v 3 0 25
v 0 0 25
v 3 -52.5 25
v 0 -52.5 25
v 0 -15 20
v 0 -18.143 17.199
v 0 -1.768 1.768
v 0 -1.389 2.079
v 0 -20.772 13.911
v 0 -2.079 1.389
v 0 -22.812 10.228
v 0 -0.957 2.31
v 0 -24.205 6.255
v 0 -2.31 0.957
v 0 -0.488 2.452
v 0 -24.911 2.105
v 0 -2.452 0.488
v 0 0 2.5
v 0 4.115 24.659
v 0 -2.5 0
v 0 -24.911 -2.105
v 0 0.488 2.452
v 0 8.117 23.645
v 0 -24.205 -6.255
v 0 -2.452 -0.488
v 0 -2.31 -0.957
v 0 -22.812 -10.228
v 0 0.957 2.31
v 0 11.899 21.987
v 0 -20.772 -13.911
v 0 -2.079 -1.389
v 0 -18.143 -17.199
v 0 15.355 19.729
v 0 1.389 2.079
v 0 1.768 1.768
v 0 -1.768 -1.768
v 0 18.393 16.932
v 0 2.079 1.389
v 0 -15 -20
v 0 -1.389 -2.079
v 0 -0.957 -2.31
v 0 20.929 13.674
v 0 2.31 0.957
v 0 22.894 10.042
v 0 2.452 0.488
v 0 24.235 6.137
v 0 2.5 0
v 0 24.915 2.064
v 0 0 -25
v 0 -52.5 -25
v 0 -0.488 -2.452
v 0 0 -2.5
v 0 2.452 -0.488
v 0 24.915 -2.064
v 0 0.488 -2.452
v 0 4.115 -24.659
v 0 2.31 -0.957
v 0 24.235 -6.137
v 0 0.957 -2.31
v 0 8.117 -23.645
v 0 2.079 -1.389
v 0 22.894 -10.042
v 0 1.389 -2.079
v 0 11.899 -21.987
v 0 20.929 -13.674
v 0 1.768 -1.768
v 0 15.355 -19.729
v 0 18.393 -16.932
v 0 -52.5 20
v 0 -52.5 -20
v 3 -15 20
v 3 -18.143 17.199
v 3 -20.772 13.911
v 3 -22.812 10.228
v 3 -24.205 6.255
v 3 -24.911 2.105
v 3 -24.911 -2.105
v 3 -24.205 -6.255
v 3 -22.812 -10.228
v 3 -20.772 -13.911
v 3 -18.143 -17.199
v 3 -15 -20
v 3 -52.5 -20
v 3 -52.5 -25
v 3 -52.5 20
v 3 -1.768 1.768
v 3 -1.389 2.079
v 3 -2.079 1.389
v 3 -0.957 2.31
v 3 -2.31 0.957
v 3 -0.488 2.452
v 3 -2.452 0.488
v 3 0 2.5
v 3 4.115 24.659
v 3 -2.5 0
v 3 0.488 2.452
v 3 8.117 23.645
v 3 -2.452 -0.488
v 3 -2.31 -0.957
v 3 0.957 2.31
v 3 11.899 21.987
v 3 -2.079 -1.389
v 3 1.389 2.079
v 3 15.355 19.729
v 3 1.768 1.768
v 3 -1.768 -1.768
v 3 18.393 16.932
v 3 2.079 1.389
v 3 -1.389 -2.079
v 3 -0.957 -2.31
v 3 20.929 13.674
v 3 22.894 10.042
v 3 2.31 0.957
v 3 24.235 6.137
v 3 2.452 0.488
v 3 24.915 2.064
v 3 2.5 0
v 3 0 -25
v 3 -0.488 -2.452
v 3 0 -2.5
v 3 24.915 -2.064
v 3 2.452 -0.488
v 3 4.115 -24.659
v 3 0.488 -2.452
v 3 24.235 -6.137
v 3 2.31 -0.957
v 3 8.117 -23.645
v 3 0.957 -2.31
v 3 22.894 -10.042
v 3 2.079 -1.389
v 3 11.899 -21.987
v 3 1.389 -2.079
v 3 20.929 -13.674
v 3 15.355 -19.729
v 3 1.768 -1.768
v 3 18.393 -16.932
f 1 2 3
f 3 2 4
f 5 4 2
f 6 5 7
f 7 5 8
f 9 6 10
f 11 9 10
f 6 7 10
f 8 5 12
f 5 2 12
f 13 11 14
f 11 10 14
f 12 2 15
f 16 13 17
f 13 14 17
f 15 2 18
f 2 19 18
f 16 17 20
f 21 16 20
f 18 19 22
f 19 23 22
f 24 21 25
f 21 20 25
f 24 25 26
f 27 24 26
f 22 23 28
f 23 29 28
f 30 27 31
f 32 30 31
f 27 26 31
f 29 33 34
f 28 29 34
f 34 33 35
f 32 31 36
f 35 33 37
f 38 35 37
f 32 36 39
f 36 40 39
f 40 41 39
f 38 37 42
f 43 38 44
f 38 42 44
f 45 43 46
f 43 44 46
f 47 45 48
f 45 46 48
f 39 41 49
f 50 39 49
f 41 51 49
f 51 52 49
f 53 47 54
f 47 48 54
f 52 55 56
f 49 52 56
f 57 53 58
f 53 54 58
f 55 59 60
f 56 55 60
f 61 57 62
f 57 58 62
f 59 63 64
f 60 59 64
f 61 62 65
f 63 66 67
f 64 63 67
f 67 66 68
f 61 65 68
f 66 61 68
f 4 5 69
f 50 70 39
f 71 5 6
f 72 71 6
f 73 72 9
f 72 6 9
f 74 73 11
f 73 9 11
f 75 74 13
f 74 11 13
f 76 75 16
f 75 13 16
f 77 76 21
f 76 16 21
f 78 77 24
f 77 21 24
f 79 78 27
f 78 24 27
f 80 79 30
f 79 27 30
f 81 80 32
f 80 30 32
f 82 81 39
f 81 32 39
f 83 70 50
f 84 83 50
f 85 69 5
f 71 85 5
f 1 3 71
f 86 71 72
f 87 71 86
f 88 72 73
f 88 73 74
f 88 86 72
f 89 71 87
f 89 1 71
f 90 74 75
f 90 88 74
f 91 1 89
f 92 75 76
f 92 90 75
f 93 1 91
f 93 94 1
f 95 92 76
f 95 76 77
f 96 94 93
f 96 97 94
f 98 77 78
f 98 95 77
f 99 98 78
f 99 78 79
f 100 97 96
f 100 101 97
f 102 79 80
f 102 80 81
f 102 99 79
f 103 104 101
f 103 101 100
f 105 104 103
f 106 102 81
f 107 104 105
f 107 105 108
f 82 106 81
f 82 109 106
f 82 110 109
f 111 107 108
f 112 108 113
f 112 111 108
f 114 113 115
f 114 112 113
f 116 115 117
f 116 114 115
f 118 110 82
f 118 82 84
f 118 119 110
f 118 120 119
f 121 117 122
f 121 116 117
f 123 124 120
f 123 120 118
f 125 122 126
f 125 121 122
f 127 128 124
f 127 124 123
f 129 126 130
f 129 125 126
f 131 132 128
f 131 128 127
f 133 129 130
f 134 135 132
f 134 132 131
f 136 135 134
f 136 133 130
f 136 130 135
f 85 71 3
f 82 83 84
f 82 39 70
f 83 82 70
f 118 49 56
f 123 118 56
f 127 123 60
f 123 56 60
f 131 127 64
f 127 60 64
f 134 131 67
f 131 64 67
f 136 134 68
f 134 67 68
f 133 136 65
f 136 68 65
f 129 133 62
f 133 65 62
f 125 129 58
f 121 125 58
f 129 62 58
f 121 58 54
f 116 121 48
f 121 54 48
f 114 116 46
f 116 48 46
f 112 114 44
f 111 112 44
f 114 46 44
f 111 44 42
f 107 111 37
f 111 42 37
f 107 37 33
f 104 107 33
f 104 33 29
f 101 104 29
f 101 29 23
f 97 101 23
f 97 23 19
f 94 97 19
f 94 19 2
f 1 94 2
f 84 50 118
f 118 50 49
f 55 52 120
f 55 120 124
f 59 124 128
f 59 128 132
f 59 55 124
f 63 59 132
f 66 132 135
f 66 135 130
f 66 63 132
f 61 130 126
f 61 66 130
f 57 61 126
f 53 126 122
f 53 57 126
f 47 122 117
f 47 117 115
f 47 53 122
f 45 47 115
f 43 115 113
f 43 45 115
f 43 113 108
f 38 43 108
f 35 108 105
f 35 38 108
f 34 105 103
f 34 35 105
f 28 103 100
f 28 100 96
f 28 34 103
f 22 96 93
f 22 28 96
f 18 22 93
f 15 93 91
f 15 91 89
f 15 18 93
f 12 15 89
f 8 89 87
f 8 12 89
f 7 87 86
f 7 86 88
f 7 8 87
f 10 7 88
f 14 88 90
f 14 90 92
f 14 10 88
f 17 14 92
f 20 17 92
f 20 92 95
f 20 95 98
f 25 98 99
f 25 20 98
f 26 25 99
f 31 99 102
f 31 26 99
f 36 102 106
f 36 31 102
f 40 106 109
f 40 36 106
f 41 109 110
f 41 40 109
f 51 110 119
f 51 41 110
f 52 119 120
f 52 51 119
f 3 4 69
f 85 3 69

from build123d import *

# Parameters (mm, degrees)
SKETCH1_R           = 2.5
BOSS_EXTRUDE1_DEPTH = 3


with BuildPart() as part:
    # Sketch1 → Boss-Extrude1 (new body)
    with BuildSketch(Plane(origin=(0, 0, 0), x_dir=(0, 0, -1), z_dir=(1, 0, 0))):
        with BuildLine():
            ThreePointArc((-20, -15), (-23.717082451, -7.90569415), (-25, 0))
            Line((-25, 0), (-25, -52.5))
            Line((-25, -52.5), (-20, -52.5))
            Line((-20, -52.5), (-20, -15))
        make_face()
        with BuildLine():
            ThreePointArc((25, 0), (0, 25), (-25, 0))
            ThreePointArc((-25, 0), (-23.717082451, -7.90569415), (-20, -15))
            ThreePointArc((-20, -15), (0, -25), (20, -15))
            ThreePointArc((20, -15), (23.717082451, -7.90569415), (25, 0))
        make_face()
        Circle(SKETCH1_R, mode=Mode.SUBTRACT)
        with BuildLine():
            Line((25, -52.5), (25, 0))
            ThreePointArc((25, 0), (23.717082451, -7.90569415), (20, -15))
            Line((20, -15), (20, -52.5))
            Line((20, -52.5), (25, -52.5))
        make_face()
    extrude(amount=BOSS_EXTRUDE1_DEPTH)


solid = part.part
